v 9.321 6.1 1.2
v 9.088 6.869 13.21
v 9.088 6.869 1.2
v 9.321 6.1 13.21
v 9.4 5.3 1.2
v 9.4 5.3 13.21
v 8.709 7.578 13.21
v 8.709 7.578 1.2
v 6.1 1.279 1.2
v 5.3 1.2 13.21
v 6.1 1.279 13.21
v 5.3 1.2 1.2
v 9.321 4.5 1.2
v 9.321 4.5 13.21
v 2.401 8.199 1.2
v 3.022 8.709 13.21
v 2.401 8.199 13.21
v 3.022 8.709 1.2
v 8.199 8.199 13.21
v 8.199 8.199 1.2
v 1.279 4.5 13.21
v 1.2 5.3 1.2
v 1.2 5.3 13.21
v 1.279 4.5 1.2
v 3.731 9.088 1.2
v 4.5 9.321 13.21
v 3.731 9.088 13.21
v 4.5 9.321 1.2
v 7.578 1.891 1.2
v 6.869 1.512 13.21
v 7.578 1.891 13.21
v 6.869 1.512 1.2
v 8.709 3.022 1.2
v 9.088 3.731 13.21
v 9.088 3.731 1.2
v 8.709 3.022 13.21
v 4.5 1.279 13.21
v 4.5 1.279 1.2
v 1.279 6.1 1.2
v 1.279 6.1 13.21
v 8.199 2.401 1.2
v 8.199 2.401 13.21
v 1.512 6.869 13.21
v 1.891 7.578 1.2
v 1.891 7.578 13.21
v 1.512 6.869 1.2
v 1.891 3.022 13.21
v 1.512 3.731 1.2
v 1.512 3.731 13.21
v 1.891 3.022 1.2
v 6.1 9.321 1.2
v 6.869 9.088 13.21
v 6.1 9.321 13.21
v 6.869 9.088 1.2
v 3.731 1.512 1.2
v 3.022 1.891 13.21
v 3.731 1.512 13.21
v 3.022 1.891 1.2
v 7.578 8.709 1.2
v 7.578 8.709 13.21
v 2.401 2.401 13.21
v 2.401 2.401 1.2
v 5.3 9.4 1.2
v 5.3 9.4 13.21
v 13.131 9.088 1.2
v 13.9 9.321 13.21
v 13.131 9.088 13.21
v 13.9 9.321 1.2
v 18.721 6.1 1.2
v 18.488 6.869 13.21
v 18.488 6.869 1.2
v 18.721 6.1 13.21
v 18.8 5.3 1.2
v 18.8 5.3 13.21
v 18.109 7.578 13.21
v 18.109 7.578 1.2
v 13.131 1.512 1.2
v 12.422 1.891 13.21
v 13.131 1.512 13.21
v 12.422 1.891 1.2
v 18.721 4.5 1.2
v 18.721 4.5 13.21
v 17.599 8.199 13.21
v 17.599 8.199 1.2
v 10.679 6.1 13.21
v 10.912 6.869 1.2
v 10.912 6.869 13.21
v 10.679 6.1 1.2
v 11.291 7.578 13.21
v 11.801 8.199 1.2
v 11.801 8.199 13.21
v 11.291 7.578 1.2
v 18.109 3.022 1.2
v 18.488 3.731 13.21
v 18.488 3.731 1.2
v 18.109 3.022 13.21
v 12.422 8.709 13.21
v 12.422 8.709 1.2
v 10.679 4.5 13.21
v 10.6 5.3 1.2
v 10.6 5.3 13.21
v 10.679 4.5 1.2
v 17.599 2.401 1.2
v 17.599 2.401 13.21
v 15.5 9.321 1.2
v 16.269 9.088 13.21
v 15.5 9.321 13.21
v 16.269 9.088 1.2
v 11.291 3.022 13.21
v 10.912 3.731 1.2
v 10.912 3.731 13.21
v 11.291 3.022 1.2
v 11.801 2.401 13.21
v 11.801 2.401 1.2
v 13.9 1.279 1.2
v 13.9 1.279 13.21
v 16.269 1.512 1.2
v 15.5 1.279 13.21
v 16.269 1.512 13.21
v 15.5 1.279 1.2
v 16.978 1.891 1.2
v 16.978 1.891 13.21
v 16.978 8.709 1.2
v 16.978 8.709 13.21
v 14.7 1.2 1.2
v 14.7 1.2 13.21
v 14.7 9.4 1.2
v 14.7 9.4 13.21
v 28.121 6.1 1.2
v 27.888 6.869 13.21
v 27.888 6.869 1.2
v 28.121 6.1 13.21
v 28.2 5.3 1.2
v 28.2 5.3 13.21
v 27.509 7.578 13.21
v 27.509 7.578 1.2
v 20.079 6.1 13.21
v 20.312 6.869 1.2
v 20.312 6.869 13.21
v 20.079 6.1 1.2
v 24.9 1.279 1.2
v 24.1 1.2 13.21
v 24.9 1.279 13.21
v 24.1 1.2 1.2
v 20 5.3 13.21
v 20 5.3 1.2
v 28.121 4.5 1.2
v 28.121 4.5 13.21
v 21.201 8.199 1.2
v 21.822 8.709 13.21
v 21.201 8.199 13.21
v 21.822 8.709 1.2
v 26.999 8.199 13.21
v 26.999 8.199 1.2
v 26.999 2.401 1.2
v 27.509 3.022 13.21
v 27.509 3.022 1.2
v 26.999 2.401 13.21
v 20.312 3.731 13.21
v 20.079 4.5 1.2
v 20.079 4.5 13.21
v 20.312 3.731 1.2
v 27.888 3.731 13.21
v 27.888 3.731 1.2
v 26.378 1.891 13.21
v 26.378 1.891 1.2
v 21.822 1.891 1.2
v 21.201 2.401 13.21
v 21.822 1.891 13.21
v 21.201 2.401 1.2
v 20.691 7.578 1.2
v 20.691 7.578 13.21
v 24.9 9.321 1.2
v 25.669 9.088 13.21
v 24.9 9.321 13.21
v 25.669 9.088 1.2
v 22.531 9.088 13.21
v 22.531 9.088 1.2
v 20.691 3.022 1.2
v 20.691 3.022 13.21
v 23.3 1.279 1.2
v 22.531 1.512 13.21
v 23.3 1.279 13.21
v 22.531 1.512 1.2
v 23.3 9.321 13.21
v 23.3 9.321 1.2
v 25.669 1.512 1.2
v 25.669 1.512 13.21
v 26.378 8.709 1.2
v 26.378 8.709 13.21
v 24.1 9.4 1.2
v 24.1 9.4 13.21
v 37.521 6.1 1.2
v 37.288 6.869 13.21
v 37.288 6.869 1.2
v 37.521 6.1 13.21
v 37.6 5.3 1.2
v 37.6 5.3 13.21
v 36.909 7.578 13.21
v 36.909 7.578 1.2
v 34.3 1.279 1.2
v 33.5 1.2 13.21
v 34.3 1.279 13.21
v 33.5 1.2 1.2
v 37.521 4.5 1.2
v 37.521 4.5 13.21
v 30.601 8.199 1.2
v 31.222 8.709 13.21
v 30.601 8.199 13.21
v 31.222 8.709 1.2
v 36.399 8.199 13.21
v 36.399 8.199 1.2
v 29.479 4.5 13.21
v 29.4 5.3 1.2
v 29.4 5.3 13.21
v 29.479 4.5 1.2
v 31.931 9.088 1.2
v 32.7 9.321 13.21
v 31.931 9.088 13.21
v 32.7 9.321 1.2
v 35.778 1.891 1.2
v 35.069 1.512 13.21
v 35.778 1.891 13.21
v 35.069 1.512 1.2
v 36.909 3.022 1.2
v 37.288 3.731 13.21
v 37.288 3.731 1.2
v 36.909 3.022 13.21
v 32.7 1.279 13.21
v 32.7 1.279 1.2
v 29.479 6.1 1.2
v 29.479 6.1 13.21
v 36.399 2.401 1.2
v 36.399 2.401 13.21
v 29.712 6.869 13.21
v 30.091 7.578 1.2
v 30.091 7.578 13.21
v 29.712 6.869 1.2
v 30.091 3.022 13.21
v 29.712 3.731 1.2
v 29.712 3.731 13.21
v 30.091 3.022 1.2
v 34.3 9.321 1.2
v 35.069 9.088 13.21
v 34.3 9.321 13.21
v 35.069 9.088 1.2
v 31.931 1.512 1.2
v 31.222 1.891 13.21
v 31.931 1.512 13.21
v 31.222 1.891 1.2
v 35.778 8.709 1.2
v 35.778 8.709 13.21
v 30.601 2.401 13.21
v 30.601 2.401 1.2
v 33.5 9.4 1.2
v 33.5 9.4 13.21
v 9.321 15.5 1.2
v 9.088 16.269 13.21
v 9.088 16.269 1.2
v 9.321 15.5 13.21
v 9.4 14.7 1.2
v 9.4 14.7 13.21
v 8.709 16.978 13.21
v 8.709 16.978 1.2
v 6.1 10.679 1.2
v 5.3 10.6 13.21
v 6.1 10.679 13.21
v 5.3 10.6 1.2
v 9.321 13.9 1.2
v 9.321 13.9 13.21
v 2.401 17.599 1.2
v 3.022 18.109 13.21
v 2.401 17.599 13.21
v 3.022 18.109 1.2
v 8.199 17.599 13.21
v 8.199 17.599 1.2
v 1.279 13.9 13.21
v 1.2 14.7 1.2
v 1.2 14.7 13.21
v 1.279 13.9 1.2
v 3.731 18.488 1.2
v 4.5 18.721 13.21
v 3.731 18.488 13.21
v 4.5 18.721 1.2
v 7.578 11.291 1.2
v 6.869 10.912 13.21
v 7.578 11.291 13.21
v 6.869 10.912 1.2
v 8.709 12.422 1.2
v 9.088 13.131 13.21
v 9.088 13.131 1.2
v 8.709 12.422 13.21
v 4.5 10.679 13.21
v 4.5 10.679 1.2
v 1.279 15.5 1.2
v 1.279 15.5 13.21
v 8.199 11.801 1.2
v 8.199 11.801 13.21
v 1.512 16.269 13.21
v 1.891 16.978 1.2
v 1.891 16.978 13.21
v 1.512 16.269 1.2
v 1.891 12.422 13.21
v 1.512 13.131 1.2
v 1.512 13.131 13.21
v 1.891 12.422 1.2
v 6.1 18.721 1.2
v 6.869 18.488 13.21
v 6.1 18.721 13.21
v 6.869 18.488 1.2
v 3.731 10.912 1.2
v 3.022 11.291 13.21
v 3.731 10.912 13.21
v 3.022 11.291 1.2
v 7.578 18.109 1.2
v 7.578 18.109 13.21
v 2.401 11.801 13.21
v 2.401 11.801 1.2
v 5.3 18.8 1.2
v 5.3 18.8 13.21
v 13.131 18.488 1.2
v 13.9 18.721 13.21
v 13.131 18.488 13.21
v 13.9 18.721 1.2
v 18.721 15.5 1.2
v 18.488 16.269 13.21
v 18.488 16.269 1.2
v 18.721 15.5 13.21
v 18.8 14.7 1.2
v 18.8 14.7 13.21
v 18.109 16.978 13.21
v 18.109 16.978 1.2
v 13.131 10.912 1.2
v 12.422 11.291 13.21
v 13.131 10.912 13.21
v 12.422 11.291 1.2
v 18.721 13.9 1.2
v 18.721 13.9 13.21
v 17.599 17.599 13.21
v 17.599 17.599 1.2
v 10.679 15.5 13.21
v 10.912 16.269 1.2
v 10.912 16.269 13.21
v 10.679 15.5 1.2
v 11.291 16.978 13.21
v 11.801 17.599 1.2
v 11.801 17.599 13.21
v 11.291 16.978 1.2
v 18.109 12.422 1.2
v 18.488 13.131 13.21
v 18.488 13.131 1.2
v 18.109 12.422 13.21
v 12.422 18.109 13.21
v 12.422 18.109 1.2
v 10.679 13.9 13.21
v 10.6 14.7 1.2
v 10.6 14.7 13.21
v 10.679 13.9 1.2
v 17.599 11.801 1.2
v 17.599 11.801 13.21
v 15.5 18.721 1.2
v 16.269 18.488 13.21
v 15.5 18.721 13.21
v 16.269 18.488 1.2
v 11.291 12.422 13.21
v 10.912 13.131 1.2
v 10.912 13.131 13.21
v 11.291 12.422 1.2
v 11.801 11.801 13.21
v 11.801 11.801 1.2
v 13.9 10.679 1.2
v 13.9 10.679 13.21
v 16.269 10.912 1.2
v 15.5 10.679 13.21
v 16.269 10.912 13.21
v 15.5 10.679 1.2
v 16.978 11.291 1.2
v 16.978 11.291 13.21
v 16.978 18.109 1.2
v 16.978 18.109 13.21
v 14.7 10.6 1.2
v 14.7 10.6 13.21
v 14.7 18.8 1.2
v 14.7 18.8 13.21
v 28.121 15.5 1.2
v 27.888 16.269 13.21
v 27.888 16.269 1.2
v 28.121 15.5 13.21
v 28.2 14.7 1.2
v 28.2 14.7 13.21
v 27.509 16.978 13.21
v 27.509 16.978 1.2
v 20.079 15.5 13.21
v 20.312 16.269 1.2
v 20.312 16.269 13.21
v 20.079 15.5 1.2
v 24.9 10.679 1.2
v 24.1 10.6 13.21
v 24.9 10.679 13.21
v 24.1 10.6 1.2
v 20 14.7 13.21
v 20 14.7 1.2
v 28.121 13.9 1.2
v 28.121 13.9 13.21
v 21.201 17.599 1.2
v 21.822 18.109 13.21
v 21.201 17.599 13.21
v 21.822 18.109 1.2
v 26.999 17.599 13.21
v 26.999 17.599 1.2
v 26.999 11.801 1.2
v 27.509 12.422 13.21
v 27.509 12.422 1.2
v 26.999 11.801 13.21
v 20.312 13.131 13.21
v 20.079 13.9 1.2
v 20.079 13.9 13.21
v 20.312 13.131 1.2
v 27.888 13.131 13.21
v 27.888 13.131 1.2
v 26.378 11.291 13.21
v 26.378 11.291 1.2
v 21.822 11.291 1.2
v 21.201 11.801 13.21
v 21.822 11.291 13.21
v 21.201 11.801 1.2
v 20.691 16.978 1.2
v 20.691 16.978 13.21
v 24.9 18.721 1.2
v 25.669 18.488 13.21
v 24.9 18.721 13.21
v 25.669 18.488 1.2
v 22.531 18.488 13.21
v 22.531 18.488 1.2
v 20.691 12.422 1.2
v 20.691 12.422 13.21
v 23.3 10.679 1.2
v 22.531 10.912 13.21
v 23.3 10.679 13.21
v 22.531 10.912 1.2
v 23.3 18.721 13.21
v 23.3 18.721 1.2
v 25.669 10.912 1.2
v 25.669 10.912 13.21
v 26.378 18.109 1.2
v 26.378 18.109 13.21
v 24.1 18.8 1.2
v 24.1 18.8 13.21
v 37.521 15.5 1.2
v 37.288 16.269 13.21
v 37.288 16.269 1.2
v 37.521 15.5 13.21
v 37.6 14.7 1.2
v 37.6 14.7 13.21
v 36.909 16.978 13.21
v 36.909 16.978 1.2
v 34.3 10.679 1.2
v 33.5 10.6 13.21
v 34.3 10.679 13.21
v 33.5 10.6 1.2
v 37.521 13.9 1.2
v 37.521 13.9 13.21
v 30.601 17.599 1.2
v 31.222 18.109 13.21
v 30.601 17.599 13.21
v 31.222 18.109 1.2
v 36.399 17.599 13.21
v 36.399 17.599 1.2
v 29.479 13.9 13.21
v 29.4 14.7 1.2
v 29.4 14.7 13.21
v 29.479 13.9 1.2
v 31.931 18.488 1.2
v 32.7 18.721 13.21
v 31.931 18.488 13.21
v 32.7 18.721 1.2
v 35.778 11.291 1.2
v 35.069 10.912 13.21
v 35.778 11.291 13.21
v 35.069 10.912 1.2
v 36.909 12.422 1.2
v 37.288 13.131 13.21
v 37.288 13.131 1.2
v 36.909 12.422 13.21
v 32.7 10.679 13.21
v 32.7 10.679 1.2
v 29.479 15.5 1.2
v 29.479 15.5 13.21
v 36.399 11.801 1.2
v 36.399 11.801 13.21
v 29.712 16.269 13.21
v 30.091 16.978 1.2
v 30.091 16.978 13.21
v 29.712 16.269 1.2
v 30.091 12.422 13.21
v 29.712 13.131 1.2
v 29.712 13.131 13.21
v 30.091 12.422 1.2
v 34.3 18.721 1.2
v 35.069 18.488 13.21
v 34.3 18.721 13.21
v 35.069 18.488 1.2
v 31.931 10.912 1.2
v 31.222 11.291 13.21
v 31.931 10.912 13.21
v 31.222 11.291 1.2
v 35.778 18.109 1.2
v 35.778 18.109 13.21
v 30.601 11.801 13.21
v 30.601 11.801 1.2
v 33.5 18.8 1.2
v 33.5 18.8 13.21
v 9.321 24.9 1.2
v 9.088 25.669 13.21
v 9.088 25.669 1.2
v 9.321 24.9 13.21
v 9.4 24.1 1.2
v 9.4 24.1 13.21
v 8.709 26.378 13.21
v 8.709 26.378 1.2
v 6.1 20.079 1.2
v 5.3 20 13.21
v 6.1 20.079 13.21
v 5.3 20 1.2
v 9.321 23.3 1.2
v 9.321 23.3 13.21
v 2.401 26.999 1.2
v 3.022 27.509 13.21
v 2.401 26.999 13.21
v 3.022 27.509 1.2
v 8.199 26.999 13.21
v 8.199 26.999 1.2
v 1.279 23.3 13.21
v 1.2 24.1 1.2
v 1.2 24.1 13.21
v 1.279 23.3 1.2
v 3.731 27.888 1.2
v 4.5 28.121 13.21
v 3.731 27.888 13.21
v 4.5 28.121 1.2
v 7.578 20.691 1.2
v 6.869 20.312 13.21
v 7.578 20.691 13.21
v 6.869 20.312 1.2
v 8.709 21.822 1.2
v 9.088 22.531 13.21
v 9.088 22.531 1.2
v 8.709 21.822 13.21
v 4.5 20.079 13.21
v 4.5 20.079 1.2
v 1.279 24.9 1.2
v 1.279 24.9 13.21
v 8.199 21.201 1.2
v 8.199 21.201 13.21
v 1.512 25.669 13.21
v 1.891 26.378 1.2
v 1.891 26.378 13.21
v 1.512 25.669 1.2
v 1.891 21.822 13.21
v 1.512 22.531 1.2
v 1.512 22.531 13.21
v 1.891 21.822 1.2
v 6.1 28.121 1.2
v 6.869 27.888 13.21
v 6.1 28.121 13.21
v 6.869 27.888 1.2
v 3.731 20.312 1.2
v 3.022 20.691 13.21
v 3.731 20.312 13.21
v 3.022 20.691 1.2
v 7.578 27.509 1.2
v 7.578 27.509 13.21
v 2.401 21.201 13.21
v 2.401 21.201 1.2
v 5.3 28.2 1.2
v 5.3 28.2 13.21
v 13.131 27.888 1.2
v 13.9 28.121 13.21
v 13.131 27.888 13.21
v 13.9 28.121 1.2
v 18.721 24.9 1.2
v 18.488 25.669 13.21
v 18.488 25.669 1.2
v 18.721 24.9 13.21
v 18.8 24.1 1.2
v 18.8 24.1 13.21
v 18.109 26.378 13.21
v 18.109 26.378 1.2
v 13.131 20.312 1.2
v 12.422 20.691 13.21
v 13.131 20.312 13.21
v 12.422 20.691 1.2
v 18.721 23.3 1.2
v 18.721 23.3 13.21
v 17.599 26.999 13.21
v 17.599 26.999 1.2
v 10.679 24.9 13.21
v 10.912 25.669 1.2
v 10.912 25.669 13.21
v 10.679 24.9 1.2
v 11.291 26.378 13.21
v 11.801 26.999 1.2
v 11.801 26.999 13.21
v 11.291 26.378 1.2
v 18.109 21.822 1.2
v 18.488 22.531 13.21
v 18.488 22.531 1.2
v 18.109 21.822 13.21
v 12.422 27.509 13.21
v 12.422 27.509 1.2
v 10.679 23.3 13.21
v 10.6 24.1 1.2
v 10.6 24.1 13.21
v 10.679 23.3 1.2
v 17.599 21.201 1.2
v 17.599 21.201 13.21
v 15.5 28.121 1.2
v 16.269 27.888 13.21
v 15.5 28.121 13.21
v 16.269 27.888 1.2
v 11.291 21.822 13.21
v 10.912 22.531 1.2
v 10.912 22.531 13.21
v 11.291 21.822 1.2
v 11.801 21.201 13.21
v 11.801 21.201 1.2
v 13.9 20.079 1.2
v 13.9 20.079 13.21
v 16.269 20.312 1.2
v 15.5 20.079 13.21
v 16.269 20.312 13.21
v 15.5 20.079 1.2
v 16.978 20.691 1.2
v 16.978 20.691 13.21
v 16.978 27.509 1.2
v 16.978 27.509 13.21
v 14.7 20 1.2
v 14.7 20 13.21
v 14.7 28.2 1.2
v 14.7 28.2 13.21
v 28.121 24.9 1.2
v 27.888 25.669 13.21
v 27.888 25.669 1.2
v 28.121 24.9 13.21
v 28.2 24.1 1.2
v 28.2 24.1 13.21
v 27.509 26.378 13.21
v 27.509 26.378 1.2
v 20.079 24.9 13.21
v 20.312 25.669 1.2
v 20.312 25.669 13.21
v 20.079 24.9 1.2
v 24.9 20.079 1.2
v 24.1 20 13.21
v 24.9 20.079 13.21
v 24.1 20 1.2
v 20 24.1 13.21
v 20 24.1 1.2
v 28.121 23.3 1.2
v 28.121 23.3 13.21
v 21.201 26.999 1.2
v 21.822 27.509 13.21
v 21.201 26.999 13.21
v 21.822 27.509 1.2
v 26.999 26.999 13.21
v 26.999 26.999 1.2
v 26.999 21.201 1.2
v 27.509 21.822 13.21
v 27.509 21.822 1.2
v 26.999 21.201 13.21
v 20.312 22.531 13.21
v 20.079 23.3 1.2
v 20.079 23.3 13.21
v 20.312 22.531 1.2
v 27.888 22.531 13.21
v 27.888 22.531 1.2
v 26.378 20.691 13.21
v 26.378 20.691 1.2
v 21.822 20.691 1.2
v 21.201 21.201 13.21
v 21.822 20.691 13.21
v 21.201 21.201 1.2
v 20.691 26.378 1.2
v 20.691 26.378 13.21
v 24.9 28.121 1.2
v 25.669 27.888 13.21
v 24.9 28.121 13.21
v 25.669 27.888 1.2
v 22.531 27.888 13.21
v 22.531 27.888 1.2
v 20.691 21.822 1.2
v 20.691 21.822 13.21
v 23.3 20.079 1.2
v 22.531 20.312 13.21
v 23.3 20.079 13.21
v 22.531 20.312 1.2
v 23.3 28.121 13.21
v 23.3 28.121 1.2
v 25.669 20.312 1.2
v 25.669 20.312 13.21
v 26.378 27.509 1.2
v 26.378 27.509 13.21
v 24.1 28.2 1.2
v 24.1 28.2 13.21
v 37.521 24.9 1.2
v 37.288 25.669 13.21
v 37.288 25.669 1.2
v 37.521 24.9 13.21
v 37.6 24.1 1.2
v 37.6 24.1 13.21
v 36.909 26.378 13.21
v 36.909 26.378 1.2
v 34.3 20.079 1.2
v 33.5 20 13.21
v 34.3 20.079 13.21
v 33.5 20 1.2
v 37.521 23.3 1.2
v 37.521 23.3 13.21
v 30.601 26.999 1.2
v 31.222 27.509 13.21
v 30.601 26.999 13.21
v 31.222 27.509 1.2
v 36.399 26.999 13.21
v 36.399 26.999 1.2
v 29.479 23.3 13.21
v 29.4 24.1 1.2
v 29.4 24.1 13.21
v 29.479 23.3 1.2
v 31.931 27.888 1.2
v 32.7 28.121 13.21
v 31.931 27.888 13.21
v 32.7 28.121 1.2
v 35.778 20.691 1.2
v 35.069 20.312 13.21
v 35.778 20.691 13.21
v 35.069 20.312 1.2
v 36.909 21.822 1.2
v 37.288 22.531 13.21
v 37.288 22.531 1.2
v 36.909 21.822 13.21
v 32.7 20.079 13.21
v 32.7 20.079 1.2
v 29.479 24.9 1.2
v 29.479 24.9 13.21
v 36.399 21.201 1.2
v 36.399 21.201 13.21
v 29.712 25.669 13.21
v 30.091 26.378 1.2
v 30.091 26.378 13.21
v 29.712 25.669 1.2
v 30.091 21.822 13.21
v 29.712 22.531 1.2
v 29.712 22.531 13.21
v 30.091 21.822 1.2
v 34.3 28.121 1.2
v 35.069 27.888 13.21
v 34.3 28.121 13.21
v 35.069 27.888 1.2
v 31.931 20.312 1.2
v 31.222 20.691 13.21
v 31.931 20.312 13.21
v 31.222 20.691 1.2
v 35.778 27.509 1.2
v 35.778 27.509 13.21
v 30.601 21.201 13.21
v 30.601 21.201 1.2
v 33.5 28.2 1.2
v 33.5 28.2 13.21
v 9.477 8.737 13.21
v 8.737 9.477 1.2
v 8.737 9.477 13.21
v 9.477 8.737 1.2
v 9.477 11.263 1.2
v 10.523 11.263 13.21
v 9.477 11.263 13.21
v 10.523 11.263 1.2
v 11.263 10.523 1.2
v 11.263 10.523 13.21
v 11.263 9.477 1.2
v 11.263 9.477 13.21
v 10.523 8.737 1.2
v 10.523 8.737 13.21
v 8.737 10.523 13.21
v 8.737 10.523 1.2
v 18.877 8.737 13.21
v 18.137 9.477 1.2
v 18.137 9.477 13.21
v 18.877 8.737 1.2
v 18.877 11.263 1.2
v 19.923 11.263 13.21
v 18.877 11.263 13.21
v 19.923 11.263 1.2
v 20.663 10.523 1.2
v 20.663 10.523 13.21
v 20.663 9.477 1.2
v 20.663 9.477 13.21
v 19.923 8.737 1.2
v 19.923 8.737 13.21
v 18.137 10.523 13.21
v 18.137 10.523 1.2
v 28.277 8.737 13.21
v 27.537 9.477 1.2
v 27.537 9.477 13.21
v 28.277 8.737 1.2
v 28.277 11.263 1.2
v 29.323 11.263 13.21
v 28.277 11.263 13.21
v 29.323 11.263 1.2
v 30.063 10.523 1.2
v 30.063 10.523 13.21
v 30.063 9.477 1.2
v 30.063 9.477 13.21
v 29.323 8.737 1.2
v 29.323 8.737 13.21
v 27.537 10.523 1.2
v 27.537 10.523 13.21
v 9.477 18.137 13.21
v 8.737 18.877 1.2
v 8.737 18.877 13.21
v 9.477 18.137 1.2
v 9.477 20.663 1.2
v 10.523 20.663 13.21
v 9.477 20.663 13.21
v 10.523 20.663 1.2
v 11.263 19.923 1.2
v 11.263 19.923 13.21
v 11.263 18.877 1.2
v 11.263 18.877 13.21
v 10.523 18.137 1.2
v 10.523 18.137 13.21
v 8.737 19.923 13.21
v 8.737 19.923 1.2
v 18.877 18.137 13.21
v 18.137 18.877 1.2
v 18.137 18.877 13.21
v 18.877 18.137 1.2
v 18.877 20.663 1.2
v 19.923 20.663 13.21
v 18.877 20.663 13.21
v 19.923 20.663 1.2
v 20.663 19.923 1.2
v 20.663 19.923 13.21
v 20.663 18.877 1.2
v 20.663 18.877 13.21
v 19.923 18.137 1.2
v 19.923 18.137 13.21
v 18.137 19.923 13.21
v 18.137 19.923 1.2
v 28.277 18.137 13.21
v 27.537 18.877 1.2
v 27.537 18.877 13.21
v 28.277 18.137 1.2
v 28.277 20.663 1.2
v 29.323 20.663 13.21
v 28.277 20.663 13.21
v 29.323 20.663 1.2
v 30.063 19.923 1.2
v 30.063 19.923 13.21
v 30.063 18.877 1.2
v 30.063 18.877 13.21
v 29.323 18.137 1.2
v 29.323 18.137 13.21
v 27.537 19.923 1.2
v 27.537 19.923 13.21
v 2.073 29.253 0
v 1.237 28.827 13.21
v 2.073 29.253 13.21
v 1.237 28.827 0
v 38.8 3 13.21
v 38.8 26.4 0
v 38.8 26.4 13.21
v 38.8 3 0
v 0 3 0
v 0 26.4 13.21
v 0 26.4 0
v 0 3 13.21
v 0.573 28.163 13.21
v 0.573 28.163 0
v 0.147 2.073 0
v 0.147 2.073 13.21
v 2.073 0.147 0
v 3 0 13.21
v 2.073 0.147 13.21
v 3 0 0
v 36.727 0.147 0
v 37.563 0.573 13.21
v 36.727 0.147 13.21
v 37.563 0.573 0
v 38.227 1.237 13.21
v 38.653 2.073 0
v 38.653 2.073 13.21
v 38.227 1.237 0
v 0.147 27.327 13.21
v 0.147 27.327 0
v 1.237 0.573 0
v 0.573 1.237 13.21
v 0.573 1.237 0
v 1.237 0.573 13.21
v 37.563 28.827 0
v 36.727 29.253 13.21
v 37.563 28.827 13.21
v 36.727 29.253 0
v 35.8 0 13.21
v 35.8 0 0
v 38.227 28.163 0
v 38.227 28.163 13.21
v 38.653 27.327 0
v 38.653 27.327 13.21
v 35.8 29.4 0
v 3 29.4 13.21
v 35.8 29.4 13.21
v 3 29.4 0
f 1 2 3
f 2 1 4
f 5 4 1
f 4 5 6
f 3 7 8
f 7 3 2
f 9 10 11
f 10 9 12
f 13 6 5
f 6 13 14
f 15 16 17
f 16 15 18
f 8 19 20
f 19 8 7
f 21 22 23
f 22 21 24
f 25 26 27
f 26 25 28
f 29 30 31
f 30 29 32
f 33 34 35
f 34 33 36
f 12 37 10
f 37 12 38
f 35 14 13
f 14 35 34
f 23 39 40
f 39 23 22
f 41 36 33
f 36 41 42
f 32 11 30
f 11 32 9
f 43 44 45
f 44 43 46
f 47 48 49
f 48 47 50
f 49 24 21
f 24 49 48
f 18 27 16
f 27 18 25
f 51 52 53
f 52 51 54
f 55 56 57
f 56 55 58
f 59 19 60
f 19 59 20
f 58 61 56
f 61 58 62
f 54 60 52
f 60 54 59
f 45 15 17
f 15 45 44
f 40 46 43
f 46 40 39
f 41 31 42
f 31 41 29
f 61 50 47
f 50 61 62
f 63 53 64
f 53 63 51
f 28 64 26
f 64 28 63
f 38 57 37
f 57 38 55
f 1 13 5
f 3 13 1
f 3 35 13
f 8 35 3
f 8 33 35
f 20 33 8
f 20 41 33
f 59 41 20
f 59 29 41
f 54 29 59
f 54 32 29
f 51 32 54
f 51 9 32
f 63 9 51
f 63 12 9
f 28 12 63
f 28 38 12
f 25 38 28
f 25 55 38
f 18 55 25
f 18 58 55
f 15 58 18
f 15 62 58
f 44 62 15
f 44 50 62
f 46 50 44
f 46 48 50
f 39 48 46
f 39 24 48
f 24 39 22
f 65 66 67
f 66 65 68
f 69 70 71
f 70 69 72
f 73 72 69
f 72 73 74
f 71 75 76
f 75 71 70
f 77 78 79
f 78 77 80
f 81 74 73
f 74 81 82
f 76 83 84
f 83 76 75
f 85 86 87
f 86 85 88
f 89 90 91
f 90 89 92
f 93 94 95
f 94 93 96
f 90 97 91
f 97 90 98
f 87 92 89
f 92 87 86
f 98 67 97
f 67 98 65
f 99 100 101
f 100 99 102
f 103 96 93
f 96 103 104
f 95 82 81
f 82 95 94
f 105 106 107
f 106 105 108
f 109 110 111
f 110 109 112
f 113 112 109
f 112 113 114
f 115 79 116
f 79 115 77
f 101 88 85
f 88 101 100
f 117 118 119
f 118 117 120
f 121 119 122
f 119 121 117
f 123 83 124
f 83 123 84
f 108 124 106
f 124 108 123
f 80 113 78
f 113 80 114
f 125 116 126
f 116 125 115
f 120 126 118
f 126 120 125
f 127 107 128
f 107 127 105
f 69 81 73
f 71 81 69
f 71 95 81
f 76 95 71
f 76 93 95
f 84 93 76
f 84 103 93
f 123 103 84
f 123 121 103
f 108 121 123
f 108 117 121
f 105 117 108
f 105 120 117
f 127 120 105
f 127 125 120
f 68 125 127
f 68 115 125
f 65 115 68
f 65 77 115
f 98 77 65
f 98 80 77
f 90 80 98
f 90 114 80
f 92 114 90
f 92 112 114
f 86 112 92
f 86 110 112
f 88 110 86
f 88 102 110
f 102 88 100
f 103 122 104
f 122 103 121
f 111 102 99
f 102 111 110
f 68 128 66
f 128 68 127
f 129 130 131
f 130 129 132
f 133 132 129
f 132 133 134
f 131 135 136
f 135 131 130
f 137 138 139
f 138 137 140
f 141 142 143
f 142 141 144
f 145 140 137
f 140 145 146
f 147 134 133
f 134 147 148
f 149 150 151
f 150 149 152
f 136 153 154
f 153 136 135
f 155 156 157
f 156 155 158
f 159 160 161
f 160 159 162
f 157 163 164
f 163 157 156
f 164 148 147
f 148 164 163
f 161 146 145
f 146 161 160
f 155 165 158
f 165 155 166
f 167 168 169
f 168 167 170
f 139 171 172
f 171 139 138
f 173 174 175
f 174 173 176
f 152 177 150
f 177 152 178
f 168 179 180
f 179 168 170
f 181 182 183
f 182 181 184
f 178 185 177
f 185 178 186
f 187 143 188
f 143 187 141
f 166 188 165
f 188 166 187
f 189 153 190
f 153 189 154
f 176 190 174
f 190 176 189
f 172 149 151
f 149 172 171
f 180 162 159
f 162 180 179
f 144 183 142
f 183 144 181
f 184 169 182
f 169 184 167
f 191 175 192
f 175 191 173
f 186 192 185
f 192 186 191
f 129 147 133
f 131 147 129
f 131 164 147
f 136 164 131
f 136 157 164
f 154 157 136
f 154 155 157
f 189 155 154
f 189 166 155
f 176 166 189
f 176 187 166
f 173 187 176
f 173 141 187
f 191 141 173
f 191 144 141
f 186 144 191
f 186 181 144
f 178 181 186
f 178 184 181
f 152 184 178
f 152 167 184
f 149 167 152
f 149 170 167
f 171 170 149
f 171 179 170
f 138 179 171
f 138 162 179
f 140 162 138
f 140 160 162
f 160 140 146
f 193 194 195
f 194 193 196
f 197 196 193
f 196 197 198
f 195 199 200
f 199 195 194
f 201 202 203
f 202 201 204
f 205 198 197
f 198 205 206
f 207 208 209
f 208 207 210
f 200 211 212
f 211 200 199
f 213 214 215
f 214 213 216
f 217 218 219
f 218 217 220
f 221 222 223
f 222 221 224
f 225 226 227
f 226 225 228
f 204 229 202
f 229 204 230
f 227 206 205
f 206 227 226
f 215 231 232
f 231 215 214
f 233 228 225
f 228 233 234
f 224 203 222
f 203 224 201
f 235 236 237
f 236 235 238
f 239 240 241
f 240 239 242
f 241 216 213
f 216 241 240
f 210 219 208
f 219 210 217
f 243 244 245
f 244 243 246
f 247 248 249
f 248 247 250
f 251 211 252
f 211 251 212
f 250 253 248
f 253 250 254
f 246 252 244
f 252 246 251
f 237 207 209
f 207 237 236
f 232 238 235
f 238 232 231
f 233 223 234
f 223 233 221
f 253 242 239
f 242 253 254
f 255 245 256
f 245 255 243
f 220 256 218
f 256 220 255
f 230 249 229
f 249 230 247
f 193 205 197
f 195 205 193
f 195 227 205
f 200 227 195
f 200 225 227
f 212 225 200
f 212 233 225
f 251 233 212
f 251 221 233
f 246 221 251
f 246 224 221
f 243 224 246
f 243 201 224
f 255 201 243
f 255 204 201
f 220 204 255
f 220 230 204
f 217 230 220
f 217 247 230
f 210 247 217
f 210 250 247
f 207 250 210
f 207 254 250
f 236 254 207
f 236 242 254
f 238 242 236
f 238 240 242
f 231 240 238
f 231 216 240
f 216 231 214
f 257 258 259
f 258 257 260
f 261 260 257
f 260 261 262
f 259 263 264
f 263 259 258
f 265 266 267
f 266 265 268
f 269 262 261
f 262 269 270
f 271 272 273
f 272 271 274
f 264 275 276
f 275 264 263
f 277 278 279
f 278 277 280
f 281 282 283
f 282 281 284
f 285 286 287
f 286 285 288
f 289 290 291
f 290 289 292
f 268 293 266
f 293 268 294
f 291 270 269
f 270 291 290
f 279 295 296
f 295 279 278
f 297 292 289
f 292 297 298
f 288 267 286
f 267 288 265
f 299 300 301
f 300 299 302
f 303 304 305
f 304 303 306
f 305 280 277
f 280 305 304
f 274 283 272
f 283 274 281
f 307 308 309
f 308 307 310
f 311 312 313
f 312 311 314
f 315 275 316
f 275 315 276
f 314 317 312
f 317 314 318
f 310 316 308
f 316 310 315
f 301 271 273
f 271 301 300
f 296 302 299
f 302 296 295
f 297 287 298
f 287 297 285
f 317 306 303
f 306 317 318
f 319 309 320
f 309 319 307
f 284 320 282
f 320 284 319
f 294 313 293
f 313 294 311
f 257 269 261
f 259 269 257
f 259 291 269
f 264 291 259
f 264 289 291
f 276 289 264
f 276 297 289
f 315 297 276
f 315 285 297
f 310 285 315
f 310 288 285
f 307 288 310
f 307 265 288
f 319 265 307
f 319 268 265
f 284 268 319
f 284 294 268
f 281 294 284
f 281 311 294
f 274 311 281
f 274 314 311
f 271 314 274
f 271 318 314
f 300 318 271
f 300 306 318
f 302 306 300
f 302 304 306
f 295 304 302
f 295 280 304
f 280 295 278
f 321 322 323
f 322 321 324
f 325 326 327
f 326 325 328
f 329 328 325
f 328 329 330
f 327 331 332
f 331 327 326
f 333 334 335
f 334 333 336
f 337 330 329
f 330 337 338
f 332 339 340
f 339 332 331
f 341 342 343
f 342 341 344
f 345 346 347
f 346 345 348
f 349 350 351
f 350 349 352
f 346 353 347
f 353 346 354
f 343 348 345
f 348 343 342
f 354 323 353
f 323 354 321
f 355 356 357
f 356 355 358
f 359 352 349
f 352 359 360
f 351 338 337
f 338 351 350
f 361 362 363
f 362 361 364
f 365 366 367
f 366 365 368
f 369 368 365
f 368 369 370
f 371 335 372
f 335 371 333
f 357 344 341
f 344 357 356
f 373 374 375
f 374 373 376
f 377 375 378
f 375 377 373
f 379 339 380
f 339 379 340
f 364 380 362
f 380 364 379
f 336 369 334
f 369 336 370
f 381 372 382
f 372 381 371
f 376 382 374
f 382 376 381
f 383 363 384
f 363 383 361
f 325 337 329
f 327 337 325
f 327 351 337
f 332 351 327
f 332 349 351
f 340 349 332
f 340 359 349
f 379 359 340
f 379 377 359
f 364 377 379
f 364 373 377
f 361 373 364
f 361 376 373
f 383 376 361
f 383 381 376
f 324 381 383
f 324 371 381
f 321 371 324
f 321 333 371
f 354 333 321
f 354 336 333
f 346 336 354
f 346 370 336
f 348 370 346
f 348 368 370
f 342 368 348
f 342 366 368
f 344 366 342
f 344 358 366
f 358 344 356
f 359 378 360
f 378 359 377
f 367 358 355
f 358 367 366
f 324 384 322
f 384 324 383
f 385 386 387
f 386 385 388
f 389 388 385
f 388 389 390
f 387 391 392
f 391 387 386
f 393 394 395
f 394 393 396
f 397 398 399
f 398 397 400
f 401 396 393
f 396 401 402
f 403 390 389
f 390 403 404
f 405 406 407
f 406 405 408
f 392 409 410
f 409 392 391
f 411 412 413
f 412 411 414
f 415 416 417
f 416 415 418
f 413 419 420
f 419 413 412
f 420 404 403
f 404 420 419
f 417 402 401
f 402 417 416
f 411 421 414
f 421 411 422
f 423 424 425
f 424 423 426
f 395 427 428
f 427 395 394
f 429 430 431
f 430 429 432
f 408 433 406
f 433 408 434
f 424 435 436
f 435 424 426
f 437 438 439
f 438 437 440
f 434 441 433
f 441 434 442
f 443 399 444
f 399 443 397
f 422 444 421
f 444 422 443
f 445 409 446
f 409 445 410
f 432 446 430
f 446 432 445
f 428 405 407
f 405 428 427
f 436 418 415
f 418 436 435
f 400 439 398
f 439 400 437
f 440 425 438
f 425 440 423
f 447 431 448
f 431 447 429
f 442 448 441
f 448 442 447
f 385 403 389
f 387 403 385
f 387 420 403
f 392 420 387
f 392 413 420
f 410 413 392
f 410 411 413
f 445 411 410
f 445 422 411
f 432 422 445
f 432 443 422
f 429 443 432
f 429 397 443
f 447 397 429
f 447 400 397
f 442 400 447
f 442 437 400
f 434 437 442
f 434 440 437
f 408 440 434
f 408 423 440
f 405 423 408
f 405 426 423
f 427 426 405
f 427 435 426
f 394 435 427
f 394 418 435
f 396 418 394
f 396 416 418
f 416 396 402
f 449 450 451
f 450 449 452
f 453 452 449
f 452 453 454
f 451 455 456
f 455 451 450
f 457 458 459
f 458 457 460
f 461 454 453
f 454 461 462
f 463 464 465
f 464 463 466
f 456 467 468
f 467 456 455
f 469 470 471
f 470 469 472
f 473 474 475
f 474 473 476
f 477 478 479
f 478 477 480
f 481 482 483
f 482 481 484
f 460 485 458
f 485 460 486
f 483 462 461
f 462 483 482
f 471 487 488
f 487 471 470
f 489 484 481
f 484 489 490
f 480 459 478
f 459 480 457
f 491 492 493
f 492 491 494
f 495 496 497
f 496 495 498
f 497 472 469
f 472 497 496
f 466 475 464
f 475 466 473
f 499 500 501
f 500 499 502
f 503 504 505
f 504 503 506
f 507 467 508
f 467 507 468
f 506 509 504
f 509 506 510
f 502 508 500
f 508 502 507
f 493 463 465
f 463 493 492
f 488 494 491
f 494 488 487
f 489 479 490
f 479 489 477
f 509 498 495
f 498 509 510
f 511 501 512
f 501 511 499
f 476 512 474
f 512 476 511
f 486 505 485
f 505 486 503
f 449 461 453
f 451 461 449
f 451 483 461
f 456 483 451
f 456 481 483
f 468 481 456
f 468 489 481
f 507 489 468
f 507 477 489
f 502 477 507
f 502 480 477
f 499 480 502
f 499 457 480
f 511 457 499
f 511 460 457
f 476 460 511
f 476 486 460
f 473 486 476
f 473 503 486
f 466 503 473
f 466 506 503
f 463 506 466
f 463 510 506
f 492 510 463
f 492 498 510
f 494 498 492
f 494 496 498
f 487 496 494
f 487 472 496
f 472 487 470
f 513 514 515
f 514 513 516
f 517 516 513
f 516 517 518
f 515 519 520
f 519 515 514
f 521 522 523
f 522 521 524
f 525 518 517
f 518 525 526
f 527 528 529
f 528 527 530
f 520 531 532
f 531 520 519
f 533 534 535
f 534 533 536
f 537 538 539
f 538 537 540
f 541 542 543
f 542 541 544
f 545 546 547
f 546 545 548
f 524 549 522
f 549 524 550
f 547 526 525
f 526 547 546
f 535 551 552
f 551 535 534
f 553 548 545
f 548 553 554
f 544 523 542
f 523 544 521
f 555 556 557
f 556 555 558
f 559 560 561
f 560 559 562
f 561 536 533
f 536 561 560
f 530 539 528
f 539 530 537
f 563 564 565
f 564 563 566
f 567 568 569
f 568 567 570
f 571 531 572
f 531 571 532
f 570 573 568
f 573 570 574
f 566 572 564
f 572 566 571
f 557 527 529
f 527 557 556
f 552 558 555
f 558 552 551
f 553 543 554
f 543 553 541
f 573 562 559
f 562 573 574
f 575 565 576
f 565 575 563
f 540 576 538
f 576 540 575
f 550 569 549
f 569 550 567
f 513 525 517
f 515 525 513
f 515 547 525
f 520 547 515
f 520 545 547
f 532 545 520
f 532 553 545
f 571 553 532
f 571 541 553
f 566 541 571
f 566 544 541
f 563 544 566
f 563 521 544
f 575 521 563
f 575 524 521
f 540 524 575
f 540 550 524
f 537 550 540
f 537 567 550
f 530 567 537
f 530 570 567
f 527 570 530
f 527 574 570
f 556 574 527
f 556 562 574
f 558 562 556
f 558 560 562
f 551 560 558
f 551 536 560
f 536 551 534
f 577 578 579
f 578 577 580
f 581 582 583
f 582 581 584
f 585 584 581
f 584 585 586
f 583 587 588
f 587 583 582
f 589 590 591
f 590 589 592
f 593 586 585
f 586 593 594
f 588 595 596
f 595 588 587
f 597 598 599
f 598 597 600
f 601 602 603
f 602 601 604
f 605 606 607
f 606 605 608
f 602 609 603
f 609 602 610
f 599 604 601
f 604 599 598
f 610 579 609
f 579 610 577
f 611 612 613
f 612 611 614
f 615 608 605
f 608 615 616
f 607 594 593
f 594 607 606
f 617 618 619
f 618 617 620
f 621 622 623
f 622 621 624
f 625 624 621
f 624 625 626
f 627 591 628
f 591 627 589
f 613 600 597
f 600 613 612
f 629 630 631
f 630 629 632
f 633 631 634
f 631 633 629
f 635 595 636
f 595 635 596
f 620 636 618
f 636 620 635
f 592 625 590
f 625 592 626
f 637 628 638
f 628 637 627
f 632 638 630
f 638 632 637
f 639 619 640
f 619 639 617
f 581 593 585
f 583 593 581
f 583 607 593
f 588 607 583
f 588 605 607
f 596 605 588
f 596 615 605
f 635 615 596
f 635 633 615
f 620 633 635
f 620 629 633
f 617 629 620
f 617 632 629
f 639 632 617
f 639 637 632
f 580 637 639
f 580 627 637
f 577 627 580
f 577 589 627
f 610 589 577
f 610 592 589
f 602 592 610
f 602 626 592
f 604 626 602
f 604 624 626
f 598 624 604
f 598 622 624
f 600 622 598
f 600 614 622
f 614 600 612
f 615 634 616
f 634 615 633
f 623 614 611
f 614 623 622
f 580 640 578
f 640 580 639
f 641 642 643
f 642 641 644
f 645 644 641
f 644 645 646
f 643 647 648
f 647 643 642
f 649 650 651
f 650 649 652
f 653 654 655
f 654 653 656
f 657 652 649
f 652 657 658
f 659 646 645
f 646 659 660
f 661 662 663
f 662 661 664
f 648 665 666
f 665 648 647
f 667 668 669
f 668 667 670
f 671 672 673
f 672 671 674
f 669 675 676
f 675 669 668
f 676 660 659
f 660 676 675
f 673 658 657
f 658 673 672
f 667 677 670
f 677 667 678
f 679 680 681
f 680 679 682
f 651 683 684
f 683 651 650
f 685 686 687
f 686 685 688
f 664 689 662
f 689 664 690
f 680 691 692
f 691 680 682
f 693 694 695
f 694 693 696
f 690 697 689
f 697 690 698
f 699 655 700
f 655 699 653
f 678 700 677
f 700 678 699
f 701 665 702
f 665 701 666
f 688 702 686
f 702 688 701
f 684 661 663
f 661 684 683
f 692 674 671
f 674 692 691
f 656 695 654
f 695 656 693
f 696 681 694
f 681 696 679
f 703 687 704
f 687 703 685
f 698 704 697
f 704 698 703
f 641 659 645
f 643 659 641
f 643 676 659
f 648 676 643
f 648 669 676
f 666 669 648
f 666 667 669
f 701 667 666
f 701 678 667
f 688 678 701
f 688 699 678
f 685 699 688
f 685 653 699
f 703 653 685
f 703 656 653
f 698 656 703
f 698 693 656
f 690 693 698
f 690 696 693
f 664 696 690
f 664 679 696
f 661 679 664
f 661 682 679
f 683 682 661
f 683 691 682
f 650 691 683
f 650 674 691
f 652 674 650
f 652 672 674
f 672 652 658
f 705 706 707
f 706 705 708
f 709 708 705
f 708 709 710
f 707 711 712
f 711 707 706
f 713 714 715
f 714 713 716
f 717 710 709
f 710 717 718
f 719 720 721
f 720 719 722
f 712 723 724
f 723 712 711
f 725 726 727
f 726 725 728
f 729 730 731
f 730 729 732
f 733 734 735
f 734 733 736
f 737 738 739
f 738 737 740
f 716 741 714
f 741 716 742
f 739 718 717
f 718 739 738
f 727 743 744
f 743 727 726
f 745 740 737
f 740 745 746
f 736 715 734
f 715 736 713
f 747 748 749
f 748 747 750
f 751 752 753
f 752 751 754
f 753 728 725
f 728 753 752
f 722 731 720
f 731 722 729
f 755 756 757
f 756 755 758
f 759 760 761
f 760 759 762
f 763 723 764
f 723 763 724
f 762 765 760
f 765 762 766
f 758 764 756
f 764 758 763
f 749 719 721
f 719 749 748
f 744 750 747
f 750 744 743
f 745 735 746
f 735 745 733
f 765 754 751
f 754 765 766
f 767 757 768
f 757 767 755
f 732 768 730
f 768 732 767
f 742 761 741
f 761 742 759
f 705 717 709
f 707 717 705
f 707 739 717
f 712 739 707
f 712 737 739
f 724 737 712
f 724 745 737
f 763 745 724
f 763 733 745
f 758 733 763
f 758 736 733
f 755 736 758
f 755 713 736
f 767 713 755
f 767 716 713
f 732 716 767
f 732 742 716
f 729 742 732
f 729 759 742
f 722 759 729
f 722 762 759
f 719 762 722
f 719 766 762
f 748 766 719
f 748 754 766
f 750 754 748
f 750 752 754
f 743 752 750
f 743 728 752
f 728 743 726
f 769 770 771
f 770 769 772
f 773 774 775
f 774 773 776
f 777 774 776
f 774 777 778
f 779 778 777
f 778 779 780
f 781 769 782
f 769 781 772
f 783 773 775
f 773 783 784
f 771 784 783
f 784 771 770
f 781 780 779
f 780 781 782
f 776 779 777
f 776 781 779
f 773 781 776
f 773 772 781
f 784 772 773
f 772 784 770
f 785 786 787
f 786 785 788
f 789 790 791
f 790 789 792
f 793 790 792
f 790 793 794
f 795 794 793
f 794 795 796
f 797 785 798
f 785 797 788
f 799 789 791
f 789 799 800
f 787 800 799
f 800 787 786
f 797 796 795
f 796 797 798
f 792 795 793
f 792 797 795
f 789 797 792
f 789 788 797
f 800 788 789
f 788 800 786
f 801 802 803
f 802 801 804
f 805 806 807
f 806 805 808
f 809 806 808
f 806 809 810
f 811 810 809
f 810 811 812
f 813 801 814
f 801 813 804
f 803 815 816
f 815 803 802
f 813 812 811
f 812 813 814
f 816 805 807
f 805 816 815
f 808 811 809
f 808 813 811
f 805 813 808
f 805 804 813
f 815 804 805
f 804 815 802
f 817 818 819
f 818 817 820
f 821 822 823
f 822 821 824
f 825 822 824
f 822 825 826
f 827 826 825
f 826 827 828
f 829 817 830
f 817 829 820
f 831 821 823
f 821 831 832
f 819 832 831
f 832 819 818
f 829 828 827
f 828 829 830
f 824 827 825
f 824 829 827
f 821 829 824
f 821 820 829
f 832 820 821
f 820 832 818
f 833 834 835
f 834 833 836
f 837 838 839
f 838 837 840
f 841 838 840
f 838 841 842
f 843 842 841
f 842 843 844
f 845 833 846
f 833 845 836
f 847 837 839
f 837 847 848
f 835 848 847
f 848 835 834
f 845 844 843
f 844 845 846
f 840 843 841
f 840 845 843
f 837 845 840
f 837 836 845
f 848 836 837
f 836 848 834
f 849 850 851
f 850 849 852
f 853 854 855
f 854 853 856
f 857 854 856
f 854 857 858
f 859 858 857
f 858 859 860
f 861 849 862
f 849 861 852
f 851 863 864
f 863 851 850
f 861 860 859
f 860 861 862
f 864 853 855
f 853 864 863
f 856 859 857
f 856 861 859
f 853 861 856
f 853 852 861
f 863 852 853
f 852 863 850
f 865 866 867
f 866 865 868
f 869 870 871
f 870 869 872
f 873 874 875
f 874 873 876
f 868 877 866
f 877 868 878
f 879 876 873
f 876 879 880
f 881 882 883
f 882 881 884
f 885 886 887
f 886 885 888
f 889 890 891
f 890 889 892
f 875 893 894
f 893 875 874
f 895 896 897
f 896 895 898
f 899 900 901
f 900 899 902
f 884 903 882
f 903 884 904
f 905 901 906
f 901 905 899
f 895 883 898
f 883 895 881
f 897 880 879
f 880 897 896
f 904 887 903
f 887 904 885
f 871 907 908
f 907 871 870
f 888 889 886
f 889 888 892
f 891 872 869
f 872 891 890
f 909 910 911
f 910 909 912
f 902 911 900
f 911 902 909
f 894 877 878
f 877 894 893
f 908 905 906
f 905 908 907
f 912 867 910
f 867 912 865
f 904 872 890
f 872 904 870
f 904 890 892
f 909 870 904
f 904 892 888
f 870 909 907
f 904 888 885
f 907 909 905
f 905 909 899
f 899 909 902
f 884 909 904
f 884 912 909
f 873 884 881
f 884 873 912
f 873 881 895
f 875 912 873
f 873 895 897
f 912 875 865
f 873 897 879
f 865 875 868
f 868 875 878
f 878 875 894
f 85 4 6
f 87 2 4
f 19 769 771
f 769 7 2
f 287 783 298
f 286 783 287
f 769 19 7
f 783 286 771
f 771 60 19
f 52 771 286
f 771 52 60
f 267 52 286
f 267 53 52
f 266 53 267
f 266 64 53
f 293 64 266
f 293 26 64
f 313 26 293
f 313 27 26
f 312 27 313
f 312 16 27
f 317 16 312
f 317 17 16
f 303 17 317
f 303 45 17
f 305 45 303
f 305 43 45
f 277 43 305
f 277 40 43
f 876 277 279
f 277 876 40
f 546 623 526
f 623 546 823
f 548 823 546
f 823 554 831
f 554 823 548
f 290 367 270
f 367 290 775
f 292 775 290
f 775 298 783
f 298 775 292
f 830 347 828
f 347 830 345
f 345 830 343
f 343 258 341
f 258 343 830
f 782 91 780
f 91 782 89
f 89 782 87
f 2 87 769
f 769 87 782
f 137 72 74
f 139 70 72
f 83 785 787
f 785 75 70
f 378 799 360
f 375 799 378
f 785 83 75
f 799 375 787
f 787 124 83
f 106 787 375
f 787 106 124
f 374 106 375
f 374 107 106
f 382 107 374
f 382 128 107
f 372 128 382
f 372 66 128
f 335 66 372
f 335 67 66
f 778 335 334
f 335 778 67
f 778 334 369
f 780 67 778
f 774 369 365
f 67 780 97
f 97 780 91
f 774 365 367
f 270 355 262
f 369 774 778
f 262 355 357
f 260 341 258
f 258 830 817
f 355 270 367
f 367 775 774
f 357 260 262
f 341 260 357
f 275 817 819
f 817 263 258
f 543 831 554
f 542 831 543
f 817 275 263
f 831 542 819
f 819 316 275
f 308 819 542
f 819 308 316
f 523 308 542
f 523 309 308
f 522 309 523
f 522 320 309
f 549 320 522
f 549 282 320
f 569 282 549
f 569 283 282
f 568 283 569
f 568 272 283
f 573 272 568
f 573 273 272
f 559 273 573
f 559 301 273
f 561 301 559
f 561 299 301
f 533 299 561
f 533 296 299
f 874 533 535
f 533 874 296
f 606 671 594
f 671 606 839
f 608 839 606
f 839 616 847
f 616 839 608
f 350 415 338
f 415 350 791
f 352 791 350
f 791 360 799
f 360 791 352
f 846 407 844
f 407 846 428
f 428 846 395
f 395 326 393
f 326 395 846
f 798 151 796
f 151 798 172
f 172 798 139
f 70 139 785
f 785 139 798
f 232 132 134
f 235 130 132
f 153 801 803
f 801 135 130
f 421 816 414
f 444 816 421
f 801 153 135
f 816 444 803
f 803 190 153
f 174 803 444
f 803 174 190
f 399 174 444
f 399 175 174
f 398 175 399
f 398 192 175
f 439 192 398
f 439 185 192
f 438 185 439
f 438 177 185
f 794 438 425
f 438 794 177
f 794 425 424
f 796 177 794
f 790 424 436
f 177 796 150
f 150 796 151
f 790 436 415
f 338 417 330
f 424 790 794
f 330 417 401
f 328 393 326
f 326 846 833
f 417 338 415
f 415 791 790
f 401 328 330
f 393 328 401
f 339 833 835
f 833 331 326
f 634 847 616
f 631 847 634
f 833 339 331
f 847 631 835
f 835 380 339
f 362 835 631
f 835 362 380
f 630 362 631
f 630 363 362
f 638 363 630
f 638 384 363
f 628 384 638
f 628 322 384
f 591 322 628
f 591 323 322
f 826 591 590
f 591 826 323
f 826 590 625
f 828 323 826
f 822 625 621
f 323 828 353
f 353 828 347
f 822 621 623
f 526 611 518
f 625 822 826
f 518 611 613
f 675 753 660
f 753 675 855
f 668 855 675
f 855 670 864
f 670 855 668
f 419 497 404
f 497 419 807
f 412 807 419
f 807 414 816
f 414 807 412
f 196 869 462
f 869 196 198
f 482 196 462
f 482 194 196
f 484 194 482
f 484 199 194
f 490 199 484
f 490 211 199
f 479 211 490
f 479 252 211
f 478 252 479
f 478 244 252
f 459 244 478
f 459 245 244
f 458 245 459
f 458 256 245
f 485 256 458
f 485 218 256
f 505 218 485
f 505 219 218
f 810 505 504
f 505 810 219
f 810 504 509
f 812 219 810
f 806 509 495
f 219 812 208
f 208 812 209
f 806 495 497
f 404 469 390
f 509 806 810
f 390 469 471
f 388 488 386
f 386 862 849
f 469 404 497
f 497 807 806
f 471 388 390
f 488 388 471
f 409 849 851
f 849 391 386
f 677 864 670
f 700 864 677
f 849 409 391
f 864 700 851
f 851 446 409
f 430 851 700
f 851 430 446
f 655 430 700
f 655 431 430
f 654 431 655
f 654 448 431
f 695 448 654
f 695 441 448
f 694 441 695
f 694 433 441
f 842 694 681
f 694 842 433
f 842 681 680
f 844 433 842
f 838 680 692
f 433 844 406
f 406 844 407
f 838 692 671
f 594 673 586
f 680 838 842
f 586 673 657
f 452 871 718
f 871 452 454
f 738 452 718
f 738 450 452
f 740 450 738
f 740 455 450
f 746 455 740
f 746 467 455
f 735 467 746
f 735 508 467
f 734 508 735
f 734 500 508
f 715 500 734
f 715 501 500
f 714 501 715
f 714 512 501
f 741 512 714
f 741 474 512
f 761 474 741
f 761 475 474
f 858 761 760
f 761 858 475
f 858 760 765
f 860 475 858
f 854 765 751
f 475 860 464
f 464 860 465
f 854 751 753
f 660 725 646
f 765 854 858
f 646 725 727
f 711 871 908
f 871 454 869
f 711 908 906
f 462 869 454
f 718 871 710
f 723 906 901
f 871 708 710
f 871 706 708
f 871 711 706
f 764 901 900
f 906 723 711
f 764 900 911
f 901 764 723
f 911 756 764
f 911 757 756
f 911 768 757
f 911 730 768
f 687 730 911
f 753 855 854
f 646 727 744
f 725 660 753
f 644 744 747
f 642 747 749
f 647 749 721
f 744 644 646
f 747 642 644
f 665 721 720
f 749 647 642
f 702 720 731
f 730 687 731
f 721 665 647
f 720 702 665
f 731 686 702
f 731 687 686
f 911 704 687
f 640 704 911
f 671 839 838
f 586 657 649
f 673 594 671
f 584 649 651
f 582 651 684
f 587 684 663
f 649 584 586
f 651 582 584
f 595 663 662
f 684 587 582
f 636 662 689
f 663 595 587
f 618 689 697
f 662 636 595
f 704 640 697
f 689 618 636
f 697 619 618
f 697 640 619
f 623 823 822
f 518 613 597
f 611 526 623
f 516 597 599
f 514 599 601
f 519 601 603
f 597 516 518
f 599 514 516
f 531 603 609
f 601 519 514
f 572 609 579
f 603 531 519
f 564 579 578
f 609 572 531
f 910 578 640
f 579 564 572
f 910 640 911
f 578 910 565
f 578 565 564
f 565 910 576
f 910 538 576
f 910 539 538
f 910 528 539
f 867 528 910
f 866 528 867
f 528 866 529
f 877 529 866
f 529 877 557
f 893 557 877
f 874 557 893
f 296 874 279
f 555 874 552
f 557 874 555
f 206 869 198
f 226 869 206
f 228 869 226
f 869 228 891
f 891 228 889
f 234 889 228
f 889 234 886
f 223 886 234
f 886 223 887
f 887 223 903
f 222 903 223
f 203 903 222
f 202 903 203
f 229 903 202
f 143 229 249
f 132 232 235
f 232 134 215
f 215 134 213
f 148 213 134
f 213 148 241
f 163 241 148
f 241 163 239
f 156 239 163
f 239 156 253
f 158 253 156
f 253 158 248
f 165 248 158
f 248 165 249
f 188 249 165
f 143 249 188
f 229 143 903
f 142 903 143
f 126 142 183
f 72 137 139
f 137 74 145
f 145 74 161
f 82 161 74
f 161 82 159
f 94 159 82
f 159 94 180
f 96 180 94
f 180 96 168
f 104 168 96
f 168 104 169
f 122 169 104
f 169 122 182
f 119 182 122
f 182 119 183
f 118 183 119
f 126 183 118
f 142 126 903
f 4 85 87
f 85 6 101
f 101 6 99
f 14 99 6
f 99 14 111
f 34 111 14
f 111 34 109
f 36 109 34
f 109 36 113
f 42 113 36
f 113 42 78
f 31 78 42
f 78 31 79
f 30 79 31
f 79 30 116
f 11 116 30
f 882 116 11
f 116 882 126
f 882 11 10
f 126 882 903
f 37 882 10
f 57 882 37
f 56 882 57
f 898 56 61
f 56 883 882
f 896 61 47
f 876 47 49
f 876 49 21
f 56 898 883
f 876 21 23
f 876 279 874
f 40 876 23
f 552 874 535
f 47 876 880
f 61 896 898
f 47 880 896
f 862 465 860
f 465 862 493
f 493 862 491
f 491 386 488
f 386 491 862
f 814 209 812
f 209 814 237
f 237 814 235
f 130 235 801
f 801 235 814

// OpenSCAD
// diameter (mm) of holes or sides of square.  Increase this to include printer error
_diam = 8.2;             
// depth of holes (mm)
_depth = 12;                
// num of columns of holes
_cols = 4;                  
// num of rows of holes
_rows = 3;                  

// hole shape
_strShape = "circle";   //[circle,square,hex]  
// radius of rounded edges on tray.  If hole shape is squares, use 0 or small number.
_rad_rounded_edge = 3;      
// should small holes be placed to save on print material?
_add_intersect_holes = 1; // [1:yes,0:no]

function int_to_bool(n) = n == 1 ? true : false; 

module hole(diam, depth, strShape)
{
    if(strShape == "circle")
    {
        cylinder(depth,d=diam, $fn=diam*4);
    }
    else if (strShape == "square")
    {
        translate([-diam/2,-diam/2,0]) cube([diam, diam, depth]);
    }
    else if (strShape == "hex")
    {
        rotate([0,0,15]) cylinder(depth,d=diam, $fn=6);
    }
    
}
module hole_array(diam, depth, cols, rows, strShape)
{
    for(r=[0: rows - 1])
    {
        translate([0, r * (diam + 1.2),0])
        for(c=[0: cols - 1])
        {
            translate([c * (diam + 1.2) ,0,1.2]) hole(diam, depth + .1, strShape);
        }
    }
}
module intersect_hole(diam, depth)
{
    rotate([0,0,360/16]) cylinder(depth, d=diam/3, $fn=8);
    //diam, depth, cols, rows
}
module intersect_hole_array(diam, depth, cols, rows)
{
    for(r=[0: rows - 2])
    {
        translate([0, r * (diam + 1.2),0])
        for(c=[0: cols - 2])
        {
            translate([c * (diam + 1.2) ,0,1.2]) intersect_hole(diam, depth + .1);
        }
    }
}
module tray(diam=10, depth=10, cols=2, rows =2, strShape = "square", rad_rounded_edge = 0, add_intersect_holes = false)
{
    
    difference()
    {   
        minkowski()
        {
            translate([rad_rounded_edge,rad_rounded_edge,0])
            cube([  ( (diam * cols) + (cols * 1.2) + (1 * 1.2) - (2*rad_rounded_edge))  , 
                      ( (diam * rows) + (rows * 1.2) + (1 * 1.2) - (2*rad_rounded_edge)) , 
                        depth + 1.2]);
            cylinder(.01,r=rad_rounded_edge, $fn=20);
        }
        translate([(diam/2) + 1.2, (diam/2) + 1.2, 0]) 
            hole_array(diam, depth, cols, rows, strShape);
        
        if(add_intersect_holes == true)
        {
            translate([diam + ( 1.2 + (1.2/2)) , diam + ( 1.2 + (1.2/2)) ,0])
            intersect_hole_array(_diam, _depth,_cols,_rows);
        }
    }
}

// output the tray
tray(_diam, _depth, _cols, _rows, _strShape, _rad_rounded_edge, int_to_bool(_add_intersect_holes));

